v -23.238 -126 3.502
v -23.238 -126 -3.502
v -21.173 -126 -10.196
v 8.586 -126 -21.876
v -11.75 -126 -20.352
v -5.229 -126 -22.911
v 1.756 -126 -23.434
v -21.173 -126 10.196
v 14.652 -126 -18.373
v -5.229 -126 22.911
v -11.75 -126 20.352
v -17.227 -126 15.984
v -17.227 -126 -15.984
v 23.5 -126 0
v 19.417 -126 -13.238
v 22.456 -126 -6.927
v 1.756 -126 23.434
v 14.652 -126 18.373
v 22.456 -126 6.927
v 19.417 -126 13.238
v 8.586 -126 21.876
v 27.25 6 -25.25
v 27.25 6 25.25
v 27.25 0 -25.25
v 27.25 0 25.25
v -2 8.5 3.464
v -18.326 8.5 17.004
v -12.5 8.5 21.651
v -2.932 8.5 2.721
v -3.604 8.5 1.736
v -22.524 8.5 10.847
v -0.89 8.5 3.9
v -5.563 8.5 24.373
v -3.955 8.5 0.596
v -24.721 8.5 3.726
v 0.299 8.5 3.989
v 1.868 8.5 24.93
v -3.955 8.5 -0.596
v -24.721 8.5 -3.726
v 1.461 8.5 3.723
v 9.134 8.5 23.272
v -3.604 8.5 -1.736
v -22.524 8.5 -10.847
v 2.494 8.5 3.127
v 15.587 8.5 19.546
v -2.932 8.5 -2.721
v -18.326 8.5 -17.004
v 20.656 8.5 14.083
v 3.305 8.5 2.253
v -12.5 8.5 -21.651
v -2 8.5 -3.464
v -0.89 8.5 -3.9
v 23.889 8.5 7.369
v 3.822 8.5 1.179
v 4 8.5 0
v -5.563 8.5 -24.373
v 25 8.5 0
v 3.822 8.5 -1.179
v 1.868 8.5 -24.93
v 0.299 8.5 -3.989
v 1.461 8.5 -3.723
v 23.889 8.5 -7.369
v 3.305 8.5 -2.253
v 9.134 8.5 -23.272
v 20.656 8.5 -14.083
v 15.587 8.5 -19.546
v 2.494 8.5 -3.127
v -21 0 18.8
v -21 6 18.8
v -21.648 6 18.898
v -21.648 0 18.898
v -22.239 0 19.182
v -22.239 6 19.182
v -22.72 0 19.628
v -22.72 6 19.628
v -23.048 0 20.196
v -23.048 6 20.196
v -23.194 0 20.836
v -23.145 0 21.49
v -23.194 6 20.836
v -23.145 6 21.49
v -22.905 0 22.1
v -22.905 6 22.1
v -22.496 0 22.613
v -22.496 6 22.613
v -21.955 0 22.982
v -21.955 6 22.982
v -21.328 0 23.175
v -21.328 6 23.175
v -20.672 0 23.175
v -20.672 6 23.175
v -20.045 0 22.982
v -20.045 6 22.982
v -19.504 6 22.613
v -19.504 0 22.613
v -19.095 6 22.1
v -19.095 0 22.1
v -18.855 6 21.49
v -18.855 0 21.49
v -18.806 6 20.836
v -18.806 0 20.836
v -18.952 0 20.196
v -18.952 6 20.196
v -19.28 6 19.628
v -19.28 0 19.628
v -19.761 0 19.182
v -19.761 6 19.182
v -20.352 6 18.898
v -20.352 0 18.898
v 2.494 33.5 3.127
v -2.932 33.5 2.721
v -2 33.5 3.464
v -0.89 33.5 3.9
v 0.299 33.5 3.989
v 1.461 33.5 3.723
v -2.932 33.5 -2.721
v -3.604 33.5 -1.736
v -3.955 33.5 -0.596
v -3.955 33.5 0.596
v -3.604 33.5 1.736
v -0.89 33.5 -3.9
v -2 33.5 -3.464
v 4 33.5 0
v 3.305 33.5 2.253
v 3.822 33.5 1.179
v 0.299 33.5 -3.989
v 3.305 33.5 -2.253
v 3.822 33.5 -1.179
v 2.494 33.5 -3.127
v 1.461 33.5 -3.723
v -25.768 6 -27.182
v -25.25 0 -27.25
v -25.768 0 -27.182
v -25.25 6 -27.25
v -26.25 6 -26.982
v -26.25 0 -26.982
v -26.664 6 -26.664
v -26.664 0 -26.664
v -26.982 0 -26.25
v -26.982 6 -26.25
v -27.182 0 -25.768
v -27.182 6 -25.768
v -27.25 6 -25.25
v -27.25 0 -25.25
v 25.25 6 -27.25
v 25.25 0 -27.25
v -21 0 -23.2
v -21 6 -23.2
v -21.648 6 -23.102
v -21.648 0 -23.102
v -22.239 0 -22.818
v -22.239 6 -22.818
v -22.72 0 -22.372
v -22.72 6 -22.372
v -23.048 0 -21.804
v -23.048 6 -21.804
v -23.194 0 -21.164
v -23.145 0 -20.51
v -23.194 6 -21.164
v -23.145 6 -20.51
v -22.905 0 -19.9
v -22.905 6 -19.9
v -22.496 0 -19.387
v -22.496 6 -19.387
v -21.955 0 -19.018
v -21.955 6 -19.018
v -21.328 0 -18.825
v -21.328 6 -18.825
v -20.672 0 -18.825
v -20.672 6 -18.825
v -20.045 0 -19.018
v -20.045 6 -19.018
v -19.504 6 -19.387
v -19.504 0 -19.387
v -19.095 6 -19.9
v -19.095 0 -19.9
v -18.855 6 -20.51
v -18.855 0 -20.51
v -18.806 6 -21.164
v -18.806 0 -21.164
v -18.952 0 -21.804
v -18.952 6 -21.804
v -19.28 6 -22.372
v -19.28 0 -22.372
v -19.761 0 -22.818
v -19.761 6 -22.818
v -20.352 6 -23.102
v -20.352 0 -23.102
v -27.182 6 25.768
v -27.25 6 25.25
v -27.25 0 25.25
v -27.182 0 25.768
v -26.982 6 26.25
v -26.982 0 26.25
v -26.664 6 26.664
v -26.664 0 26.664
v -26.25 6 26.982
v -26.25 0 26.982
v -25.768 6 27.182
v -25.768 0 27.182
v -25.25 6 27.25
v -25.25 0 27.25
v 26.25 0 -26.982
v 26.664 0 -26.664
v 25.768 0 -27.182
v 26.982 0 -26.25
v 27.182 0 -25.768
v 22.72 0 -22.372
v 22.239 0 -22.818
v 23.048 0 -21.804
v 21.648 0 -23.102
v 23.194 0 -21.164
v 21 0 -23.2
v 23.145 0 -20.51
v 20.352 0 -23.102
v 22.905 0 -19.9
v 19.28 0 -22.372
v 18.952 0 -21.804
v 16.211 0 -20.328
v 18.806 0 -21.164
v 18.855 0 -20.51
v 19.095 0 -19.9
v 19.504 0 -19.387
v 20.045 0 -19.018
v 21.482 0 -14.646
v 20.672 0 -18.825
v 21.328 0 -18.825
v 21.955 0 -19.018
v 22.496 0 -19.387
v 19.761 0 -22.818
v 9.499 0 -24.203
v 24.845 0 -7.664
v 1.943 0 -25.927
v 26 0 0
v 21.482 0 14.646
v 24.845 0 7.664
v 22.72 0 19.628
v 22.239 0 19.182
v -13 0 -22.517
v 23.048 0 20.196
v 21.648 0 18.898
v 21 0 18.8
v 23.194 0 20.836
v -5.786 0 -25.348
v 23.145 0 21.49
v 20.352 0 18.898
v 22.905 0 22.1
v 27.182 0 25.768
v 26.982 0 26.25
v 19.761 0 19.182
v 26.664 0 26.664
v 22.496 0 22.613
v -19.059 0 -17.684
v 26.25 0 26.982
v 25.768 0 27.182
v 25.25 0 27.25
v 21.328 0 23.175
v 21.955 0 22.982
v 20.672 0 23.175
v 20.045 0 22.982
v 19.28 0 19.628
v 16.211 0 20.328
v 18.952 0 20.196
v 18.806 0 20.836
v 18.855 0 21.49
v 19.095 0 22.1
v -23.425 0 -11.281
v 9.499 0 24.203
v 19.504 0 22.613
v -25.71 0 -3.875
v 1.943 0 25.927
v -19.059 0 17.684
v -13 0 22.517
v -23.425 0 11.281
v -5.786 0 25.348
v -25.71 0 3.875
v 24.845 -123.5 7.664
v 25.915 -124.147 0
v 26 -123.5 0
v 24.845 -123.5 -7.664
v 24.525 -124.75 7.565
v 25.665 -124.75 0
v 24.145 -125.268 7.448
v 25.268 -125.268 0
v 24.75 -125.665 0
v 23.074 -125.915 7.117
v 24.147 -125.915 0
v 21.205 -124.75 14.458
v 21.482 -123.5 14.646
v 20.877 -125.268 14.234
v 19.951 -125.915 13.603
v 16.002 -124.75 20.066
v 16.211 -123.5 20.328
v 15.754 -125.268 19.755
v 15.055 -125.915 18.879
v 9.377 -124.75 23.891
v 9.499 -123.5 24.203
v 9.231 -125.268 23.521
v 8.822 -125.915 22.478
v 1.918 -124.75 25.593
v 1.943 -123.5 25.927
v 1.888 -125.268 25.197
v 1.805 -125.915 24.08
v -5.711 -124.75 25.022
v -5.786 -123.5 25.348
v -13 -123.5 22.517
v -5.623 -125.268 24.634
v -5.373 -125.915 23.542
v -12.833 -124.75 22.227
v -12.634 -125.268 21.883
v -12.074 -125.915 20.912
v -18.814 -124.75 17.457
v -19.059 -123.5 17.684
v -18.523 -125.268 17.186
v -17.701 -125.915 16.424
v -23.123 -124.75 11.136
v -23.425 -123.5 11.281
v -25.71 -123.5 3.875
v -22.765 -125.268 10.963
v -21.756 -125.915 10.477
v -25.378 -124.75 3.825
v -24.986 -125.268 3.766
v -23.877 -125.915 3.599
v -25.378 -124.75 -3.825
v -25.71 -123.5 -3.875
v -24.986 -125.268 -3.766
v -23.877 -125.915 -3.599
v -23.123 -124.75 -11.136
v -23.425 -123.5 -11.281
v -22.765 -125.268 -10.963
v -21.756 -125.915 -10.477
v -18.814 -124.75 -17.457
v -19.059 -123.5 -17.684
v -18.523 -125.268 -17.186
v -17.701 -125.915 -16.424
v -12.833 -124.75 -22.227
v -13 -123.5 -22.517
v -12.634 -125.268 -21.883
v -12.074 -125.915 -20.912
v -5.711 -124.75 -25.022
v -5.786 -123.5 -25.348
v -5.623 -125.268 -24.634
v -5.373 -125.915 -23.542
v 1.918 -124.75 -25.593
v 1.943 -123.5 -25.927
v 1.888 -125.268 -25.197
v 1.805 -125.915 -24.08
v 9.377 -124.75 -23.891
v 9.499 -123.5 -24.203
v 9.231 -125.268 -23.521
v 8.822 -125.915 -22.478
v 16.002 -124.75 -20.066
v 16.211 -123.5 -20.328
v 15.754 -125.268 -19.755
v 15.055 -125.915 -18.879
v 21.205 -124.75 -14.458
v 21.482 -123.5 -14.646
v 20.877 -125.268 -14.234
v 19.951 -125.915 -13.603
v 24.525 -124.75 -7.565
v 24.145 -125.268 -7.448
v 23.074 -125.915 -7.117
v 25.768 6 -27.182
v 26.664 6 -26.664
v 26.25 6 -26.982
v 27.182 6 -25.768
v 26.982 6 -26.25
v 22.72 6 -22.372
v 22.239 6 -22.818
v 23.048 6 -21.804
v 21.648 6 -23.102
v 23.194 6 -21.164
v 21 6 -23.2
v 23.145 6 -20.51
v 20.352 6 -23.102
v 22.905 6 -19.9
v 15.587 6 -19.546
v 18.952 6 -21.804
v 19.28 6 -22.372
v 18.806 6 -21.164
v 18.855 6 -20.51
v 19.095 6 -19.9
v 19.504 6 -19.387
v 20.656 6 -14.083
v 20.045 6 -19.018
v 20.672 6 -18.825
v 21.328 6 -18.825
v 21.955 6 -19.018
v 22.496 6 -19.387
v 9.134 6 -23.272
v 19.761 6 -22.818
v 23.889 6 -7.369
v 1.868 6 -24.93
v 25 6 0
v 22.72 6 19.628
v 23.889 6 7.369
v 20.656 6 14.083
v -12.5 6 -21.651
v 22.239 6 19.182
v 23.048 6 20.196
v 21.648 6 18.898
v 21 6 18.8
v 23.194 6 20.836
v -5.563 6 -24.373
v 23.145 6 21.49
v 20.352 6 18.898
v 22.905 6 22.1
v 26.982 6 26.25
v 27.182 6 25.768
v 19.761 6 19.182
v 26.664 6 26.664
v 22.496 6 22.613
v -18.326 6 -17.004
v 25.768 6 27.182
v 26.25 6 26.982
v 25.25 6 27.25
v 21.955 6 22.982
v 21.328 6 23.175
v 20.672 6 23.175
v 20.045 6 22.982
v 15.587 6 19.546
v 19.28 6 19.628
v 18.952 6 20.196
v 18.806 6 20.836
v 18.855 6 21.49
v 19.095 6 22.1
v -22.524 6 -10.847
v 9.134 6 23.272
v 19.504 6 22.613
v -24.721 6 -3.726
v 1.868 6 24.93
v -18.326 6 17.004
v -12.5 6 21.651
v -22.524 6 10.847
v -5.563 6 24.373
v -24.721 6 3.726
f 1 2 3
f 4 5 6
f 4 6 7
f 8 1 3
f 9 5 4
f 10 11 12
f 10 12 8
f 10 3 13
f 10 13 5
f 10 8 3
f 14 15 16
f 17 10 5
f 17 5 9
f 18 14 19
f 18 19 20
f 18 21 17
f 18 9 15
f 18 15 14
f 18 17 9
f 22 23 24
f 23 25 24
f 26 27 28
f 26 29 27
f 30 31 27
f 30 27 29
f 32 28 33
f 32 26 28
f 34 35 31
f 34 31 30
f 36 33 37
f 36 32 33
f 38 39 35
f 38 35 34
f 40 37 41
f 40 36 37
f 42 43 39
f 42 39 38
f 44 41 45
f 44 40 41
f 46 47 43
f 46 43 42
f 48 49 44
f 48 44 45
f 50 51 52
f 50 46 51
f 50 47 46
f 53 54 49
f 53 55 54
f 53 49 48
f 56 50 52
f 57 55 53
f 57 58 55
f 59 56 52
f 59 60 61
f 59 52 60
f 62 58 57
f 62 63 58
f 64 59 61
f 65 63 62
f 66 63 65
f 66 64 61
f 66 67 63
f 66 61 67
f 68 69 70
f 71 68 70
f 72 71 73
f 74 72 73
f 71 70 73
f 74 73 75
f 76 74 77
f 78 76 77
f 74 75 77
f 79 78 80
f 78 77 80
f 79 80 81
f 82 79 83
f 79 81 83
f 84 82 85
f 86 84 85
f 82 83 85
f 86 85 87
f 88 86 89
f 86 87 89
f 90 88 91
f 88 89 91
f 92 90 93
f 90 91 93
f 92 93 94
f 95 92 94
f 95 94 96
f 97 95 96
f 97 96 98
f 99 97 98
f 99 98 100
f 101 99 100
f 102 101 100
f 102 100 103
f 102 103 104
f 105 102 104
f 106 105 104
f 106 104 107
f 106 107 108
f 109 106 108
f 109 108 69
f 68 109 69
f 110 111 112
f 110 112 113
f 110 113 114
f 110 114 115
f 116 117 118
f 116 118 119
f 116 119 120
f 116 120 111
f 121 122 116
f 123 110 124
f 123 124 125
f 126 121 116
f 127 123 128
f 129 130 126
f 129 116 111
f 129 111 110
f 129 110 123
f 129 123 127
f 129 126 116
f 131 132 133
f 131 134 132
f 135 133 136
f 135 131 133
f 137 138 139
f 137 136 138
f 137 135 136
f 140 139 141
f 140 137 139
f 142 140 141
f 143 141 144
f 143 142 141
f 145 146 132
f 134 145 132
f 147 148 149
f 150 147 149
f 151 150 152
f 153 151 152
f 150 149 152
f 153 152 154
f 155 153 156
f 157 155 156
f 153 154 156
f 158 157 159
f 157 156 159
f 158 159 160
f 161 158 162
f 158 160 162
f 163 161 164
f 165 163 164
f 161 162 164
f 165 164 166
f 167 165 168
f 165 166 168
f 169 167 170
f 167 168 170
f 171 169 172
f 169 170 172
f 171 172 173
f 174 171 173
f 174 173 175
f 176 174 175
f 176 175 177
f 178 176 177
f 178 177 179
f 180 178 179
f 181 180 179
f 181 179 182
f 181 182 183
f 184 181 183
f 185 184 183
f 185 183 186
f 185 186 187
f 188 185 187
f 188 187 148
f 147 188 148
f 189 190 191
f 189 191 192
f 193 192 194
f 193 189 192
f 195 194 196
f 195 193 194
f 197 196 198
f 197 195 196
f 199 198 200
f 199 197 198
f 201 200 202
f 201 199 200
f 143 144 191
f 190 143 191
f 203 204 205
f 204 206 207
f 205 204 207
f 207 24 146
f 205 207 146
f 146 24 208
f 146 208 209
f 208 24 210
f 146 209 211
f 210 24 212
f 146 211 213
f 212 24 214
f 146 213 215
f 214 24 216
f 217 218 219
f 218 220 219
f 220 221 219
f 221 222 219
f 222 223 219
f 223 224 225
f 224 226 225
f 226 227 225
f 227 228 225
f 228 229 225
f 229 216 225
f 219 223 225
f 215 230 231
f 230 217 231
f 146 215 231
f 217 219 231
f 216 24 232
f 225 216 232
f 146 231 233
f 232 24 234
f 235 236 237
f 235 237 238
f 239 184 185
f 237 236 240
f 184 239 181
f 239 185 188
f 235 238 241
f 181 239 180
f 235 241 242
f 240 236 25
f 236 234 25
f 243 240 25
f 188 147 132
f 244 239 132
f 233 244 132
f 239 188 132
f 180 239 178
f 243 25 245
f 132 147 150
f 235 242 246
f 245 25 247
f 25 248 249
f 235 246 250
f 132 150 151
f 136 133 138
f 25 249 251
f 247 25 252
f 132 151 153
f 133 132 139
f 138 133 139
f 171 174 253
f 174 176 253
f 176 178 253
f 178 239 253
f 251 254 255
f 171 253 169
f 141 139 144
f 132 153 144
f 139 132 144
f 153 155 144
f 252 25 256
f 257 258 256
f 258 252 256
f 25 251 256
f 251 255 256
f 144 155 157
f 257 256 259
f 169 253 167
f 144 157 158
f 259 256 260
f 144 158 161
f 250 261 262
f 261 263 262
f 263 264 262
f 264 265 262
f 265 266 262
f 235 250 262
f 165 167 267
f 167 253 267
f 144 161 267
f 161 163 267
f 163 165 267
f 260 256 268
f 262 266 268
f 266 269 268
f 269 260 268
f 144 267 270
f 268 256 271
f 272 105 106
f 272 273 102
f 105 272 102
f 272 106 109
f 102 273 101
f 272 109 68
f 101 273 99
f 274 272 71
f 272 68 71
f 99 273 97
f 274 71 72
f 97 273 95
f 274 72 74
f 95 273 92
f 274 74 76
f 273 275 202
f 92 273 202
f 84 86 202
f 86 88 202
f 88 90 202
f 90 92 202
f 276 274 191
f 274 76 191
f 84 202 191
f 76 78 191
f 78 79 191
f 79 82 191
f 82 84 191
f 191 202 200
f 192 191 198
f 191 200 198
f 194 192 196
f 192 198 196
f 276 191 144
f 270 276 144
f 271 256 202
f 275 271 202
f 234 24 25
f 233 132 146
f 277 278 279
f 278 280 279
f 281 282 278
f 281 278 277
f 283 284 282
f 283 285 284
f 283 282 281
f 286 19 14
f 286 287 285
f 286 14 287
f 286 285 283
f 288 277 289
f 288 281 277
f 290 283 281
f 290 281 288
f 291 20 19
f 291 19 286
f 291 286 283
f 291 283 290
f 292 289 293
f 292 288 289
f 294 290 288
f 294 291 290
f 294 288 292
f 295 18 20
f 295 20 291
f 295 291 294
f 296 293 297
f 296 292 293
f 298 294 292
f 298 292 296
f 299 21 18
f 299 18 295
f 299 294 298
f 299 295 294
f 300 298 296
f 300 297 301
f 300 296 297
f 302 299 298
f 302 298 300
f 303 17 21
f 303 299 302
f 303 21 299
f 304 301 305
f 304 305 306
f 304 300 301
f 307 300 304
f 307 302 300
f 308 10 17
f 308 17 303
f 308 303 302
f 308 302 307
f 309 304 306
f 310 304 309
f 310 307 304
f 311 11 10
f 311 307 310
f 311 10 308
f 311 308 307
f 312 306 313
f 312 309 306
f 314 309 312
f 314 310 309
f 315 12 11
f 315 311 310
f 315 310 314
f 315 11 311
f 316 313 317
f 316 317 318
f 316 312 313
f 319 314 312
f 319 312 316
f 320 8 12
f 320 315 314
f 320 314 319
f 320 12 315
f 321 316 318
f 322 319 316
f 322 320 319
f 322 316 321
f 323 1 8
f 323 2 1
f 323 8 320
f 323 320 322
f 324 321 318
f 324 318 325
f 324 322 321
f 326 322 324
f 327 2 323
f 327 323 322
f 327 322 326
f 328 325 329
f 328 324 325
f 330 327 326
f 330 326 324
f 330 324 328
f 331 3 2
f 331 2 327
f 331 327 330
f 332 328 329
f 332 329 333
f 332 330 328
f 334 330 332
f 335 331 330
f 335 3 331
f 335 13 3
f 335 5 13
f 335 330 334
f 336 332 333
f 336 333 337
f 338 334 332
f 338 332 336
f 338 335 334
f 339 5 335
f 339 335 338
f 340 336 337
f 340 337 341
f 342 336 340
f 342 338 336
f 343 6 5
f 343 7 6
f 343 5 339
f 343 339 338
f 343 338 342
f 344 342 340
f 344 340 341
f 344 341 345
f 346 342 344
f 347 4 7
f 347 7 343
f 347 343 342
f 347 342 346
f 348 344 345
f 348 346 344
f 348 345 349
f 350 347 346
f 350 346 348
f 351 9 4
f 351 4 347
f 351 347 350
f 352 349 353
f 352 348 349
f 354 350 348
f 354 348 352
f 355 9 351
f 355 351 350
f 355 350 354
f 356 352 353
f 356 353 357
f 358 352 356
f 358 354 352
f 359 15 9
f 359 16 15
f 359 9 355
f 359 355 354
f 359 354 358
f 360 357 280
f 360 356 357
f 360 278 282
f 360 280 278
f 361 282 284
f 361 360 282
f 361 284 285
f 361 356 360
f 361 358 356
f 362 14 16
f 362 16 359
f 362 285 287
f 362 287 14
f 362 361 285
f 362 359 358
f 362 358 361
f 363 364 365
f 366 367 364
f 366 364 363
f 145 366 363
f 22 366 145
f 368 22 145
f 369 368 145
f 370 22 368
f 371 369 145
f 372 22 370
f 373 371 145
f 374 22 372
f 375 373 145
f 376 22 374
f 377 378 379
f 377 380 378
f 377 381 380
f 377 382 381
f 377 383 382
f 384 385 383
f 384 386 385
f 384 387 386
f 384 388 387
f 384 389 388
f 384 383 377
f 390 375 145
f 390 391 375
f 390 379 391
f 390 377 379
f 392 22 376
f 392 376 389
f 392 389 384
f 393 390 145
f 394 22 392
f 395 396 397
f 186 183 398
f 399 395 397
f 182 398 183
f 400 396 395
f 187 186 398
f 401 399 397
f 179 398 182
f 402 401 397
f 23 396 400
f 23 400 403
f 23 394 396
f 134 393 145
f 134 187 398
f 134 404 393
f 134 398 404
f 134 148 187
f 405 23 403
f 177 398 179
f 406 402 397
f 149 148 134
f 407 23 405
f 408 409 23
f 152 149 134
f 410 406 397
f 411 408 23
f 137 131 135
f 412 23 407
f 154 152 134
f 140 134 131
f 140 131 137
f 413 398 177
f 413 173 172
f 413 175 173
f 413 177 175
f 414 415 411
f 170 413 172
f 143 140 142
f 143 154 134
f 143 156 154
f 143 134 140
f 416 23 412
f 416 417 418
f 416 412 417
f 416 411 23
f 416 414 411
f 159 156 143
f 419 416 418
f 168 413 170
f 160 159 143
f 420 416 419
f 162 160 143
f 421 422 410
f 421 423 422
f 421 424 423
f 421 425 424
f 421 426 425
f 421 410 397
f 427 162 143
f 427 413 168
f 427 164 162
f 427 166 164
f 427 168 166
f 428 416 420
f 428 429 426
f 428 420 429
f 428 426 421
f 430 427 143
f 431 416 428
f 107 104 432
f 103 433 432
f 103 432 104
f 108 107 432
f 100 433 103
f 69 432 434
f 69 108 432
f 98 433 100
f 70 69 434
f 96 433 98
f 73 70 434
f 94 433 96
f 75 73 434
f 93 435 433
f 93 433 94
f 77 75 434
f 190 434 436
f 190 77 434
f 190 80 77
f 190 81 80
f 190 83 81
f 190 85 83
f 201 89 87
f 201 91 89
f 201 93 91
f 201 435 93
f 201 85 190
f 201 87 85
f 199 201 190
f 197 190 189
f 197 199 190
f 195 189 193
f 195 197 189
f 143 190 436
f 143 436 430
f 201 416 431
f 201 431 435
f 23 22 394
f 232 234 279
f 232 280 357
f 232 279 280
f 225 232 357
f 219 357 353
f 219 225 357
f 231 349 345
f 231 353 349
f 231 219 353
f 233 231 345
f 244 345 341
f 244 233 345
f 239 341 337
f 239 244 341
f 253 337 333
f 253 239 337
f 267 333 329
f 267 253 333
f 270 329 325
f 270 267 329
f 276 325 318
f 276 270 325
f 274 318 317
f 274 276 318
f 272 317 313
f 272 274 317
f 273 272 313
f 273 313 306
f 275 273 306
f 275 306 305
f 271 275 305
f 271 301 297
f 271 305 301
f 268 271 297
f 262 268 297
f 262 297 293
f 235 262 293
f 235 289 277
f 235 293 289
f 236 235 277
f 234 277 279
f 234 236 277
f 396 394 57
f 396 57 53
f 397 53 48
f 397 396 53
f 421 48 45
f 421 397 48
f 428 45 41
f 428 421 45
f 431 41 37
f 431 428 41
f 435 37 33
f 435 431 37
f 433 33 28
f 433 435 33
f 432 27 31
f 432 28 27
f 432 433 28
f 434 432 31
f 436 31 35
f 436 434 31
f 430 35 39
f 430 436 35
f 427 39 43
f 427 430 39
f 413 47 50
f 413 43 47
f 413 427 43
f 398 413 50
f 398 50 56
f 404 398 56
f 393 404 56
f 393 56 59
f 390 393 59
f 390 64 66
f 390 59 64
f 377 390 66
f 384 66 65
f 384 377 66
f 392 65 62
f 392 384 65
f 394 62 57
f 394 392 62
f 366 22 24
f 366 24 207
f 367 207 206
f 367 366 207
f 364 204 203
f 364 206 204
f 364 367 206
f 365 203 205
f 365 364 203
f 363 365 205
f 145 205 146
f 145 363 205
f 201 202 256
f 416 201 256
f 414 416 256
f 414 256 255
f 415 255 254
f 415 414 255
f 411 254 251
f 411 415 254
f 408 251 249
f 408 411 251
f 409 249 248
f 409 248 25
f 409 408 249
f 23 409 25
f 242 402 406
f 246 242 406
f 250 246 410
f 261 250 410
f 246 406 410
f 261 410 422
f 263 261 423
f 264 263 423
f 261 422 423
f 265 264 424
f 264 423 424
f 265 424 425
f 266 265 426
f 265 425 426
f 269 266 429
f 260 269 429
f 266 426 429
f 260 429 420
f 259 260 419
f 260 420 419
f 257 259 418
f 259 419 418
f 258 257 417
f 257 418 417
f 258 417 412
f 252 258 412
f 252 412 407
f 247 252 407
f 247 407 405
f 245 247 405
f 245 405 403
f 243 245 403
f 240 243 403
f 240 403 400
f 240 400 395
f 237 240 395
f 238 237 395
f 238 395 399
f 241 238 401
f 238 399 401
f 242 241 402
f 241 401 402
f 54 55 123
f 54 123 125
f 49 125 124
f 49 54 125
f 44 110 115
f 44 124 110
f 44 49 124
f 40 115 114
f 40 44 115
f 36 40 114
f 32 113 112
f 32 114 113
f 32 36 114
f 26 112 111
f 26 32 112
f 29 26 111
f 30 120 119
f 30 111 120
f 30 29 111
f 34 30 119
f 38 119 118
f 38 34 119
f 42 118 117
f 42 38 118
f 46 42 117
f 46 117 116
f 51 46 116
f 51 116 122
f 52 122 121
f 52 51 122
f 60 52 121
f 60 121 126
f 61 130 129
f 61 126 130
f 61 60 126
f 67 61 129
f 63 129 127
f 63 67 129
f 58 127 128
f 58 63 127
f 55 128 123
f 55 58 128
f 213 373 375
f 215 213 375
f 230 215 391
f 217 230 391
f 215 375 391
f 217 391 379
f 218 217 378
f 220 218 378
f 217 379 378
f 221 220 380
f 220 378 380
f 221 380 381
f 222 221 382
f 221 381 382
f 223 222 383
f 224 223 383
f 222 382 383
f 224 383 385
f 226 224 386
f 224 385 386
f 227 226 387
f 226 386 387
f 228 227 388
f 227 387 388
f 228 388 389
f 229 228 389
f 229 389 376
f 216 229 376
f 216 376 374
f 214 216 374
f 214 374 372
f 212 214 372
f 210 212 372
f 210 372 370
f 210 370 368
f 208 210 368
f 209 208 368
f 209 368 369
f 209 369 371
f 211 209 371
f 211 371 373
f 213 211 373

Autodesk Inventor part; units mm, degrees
ref_plane "YZ Plane" through (0, 0, 0) normal (1, 0, 0) x (0, 1, 0)
ref_plane "XZ Plane" through (0, 0, 0) normal (0, 1, 0) x (-1, 0, 0)
ref_plane "XY Plane" through (0, 0, 0) normal (0, 0, 1) x (1, 0, 0)
sketch "Sketch1" plane through (0, 0, 0) normal (0, 1, 0) x (-1, 0, 0)
  line L0 (27.25, 27.25) -> (-27.25, 27.25)
  line L1 (-27.25, 27.25) -> (-27.25, -27.25)
  line L2 (-27.25, -27.25) -> (27.25, -27.25)
  line L3 (27.25, -27.25) -> (27.25, 27.25)
  line L4 (27.25, 27.25) -> (-27.25, -27.25) construction
  line L5 (-27.25, 27.25) -> (27.25, -27.25) construction
  line L6 (21, 21) -> (-21, 21)
  line L7 (-21, 21) -> (-21, -21)
  line L8 (-21, -21) -> (21, -21)
  line L9 (21, -21) -> (21, 21)
  line L10 (21, 21) -> (-21, -21) construction
  line L11 (-21, 21) -> (21, -21) construction
  point P0 (0, 0)
  dimension "d0" = 54.5
  dimension "d1" = 54.5
  dimension "d2" = 42
  dimension "d3" = 42
extrude "Extrusion1" add sketch "Sketch1" along normal blind 6 contours L3 L2 L1 L0 | L9 L8 L7 L6
sketch "Sketch2" plane through (0, 6, 0) normal (0, 1, 0) x (1, 0, 0)
  circle A0 centre (0, 0) radius 25
  dimension "d7" = 50
extrude "Extrusion2" add sketch "Sketch2" along normal blind 2.5
sketch "Sketch3" plane through (0, 0, 0) normal (0, -1, 0) x (1, 0, 0)
  circle A0 centre (0, 0) radius 26
  dimension "d10" = 52
extrude "Extrusion3" add sketch "Sketch3" along normal blind 126
fillet "Fillet1" radius 2.5 1 edges at (-26, -126, 0)
fillet "Fillet2" radius 2 4 edges at (27.25, 3, -27.25) (-27.25, 3, -27.25) (-27.25, 3, 27.25) (27.25, 3, 27.25)
hole "Hole1" at (21, 0, -21) at (21, 0, 21) at (-21, 0, -21) at (-21, 0, 21) direction (0, 1, 0) diameter 4.4 end through all
sketch "Sketch4" plane through (0, 8.5, 0) normal (0, 1, 0) x (1, 0, 0)
  circle A0 centre (0, 0) radius 4
  dimension "d22" = 8
extrude "Extrusion4" add sketch "Sketch4" along normal blind 25
equation "\"d1\" = d0"
equation "\"d3\" = d2"
properties part number "Nanotec-DH038-Servo"
